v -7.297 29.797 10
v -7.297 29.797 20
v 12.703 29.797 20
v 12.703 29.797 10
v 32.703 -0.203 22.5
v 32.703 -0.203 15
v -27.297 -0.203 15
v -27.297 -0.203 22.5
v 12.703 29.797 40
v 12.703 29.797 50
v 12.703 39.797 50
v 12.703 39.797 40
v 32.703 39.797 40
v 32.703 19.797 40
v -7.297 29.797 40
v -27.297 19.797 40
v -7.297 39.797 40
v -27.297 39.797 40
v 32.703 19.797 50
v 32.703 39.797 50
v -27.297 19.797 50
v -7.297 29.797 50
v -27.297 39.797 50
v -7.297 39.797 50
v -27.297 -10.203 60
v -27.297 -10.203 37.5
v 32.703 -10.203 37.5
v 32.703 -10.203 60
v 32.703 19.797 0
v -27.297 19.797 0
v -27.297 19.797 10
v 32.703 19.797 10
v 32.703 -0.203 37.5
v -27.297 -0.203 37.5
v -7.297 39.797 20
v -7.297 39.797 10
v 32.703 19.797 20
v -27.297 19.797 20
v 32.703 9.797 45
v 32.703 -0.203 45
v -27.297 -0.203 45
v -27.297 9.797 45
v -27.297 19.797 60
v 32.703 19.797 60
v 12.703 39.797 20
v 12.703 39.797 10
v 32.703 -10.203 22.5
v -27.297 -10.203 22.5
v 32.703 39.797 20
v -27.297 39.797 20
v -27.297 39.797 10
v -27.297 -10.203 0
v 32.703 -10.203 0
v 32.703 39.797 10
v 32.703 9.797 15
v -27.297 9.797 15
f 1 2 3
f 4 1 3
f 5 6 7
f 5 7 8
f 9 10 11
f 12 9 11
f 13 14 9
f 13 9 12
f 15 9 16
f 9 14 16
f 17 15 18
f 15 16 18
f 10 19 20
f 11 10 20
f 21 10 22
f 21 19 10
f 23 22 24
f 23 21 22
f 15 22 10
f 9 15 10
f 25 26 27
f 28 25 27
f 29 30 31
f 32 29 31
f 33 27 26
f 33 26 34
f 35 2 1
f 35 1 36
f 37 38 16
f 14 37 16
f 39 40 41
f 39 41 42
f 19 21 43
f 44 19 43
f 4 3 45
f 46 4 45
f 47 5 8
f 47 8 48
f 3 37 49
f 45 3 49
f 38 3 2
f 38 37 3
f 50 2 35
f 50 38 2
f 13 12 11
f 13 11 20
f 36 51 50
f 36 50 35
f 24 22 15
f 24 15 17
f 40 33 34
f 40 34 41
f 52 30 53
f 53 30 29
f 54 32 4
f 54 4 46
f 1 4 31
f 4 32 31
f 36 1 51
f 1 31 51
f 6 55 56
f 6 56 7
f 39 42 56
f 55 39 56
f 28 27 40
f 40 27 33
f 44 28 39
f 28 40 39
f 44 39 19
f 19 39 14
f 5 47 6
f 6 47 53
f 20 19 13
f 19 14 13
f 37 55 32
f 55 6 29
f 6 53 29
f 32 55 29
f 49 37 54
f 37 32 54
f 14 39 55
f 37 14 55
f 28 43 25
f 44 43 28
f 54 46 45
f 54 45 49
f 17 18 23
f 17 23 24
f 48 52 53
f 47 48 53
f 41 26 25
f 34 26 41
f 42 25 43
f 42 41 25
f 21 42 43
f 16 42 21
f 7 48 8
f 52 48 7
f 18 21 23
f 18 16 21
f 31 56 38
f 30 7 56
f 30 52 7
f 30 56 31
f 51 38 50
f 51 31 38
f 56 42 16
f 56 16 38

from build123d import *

# Parameters (mm, degrees)
SKETCH2_W           = 60
SKETCH2_H           = 50
BOSS_EXTRUDE2_DEPTH = 60
SKETCH4_W           = 10
SKETCH4_H           = 20
CUT_EXTRUDE2_DEPTH  = 60
CUT_EXTRUDE4_DEPTH  = 60
SKETCH8_W           = 20
SKETCH8_H           = 20
CUT_EXTRUDE5_DEPTH  = 60
SKETCH9_W           = 20
SKETCH9_H           = 10
CUT_EXTRUDE6_DEPTH  = 40


with BuildPart() as part:
    # Sketch2 → Boss-Extrude2 (new body)
    with BuildSketch(Plane.XY):
        with Locations((2.702702703, 14.797297297)):
            Rectangle(SKETCH2_W, SKETCH2_H)
    extrude(amount=BOSS_EXTRUDE2_DEPTH)

    # Sketch4 → Cut-Extrude2 (cut)
    with BuildSketch(Plane.ZY.offset(27.297297297)):
        with Locations((5, 29.797297297)):
            Rectangle(SKETCH4_W, SKETCH4_H)
        with Locations((55, 29.797297297)):
            Rectangle(SKETCH4_W, SKETCH4_H)
    extrude(amount=-CUT_EXTRUDE2_DEPTH, mode=Mode.SUBTRACT)

    # Sketch7 → Cut-Extrude4 (cut)
    with BuildSketch(Plane(origin=(32.702702703, 0, 0), x_dir=(0, 0, -1), z_dir=(1, 0, 0))):
        Polygon((-37.5, -10.202702703), (-37.5, -0.202702703), (-45, -0.202702703), (-45, 9.797297297), (-15, 9.797297297), (-15, -0.202702703), (-22.5, -0.202702703), (-22.5, -10.202702703), align=None)
    extrude(amount=-CUT_EXTRUDE4_DEPTH, mode=Mode.SUBTRACT)

    # Sketch8 → Cut-Extrude5 (cut)
    with BuildSketch(Plane.ZY.offset(27.297297297)):
        with Locations((30, 29.797297297)):
            Rectangle(SKETCH8_W, SKETCH8_H)
    extrude(amount=-CUT_EXTRUDE5_DEPTH, mode=Mode.SUBTRACT)

    # Sketch9 → Cut-Extrude6 (cut)
    with BuildSketch(Plane.XY.offset(50)):
        with Locations((2.702702703, 34.797297297)):
            Rectangle(SKETCH9_W, SKETCH9_H)
    extrude(amount=-CUT_EXTRUDE6_DEPTH, mode=Mode.SUBTRACT)


solid = part.part
